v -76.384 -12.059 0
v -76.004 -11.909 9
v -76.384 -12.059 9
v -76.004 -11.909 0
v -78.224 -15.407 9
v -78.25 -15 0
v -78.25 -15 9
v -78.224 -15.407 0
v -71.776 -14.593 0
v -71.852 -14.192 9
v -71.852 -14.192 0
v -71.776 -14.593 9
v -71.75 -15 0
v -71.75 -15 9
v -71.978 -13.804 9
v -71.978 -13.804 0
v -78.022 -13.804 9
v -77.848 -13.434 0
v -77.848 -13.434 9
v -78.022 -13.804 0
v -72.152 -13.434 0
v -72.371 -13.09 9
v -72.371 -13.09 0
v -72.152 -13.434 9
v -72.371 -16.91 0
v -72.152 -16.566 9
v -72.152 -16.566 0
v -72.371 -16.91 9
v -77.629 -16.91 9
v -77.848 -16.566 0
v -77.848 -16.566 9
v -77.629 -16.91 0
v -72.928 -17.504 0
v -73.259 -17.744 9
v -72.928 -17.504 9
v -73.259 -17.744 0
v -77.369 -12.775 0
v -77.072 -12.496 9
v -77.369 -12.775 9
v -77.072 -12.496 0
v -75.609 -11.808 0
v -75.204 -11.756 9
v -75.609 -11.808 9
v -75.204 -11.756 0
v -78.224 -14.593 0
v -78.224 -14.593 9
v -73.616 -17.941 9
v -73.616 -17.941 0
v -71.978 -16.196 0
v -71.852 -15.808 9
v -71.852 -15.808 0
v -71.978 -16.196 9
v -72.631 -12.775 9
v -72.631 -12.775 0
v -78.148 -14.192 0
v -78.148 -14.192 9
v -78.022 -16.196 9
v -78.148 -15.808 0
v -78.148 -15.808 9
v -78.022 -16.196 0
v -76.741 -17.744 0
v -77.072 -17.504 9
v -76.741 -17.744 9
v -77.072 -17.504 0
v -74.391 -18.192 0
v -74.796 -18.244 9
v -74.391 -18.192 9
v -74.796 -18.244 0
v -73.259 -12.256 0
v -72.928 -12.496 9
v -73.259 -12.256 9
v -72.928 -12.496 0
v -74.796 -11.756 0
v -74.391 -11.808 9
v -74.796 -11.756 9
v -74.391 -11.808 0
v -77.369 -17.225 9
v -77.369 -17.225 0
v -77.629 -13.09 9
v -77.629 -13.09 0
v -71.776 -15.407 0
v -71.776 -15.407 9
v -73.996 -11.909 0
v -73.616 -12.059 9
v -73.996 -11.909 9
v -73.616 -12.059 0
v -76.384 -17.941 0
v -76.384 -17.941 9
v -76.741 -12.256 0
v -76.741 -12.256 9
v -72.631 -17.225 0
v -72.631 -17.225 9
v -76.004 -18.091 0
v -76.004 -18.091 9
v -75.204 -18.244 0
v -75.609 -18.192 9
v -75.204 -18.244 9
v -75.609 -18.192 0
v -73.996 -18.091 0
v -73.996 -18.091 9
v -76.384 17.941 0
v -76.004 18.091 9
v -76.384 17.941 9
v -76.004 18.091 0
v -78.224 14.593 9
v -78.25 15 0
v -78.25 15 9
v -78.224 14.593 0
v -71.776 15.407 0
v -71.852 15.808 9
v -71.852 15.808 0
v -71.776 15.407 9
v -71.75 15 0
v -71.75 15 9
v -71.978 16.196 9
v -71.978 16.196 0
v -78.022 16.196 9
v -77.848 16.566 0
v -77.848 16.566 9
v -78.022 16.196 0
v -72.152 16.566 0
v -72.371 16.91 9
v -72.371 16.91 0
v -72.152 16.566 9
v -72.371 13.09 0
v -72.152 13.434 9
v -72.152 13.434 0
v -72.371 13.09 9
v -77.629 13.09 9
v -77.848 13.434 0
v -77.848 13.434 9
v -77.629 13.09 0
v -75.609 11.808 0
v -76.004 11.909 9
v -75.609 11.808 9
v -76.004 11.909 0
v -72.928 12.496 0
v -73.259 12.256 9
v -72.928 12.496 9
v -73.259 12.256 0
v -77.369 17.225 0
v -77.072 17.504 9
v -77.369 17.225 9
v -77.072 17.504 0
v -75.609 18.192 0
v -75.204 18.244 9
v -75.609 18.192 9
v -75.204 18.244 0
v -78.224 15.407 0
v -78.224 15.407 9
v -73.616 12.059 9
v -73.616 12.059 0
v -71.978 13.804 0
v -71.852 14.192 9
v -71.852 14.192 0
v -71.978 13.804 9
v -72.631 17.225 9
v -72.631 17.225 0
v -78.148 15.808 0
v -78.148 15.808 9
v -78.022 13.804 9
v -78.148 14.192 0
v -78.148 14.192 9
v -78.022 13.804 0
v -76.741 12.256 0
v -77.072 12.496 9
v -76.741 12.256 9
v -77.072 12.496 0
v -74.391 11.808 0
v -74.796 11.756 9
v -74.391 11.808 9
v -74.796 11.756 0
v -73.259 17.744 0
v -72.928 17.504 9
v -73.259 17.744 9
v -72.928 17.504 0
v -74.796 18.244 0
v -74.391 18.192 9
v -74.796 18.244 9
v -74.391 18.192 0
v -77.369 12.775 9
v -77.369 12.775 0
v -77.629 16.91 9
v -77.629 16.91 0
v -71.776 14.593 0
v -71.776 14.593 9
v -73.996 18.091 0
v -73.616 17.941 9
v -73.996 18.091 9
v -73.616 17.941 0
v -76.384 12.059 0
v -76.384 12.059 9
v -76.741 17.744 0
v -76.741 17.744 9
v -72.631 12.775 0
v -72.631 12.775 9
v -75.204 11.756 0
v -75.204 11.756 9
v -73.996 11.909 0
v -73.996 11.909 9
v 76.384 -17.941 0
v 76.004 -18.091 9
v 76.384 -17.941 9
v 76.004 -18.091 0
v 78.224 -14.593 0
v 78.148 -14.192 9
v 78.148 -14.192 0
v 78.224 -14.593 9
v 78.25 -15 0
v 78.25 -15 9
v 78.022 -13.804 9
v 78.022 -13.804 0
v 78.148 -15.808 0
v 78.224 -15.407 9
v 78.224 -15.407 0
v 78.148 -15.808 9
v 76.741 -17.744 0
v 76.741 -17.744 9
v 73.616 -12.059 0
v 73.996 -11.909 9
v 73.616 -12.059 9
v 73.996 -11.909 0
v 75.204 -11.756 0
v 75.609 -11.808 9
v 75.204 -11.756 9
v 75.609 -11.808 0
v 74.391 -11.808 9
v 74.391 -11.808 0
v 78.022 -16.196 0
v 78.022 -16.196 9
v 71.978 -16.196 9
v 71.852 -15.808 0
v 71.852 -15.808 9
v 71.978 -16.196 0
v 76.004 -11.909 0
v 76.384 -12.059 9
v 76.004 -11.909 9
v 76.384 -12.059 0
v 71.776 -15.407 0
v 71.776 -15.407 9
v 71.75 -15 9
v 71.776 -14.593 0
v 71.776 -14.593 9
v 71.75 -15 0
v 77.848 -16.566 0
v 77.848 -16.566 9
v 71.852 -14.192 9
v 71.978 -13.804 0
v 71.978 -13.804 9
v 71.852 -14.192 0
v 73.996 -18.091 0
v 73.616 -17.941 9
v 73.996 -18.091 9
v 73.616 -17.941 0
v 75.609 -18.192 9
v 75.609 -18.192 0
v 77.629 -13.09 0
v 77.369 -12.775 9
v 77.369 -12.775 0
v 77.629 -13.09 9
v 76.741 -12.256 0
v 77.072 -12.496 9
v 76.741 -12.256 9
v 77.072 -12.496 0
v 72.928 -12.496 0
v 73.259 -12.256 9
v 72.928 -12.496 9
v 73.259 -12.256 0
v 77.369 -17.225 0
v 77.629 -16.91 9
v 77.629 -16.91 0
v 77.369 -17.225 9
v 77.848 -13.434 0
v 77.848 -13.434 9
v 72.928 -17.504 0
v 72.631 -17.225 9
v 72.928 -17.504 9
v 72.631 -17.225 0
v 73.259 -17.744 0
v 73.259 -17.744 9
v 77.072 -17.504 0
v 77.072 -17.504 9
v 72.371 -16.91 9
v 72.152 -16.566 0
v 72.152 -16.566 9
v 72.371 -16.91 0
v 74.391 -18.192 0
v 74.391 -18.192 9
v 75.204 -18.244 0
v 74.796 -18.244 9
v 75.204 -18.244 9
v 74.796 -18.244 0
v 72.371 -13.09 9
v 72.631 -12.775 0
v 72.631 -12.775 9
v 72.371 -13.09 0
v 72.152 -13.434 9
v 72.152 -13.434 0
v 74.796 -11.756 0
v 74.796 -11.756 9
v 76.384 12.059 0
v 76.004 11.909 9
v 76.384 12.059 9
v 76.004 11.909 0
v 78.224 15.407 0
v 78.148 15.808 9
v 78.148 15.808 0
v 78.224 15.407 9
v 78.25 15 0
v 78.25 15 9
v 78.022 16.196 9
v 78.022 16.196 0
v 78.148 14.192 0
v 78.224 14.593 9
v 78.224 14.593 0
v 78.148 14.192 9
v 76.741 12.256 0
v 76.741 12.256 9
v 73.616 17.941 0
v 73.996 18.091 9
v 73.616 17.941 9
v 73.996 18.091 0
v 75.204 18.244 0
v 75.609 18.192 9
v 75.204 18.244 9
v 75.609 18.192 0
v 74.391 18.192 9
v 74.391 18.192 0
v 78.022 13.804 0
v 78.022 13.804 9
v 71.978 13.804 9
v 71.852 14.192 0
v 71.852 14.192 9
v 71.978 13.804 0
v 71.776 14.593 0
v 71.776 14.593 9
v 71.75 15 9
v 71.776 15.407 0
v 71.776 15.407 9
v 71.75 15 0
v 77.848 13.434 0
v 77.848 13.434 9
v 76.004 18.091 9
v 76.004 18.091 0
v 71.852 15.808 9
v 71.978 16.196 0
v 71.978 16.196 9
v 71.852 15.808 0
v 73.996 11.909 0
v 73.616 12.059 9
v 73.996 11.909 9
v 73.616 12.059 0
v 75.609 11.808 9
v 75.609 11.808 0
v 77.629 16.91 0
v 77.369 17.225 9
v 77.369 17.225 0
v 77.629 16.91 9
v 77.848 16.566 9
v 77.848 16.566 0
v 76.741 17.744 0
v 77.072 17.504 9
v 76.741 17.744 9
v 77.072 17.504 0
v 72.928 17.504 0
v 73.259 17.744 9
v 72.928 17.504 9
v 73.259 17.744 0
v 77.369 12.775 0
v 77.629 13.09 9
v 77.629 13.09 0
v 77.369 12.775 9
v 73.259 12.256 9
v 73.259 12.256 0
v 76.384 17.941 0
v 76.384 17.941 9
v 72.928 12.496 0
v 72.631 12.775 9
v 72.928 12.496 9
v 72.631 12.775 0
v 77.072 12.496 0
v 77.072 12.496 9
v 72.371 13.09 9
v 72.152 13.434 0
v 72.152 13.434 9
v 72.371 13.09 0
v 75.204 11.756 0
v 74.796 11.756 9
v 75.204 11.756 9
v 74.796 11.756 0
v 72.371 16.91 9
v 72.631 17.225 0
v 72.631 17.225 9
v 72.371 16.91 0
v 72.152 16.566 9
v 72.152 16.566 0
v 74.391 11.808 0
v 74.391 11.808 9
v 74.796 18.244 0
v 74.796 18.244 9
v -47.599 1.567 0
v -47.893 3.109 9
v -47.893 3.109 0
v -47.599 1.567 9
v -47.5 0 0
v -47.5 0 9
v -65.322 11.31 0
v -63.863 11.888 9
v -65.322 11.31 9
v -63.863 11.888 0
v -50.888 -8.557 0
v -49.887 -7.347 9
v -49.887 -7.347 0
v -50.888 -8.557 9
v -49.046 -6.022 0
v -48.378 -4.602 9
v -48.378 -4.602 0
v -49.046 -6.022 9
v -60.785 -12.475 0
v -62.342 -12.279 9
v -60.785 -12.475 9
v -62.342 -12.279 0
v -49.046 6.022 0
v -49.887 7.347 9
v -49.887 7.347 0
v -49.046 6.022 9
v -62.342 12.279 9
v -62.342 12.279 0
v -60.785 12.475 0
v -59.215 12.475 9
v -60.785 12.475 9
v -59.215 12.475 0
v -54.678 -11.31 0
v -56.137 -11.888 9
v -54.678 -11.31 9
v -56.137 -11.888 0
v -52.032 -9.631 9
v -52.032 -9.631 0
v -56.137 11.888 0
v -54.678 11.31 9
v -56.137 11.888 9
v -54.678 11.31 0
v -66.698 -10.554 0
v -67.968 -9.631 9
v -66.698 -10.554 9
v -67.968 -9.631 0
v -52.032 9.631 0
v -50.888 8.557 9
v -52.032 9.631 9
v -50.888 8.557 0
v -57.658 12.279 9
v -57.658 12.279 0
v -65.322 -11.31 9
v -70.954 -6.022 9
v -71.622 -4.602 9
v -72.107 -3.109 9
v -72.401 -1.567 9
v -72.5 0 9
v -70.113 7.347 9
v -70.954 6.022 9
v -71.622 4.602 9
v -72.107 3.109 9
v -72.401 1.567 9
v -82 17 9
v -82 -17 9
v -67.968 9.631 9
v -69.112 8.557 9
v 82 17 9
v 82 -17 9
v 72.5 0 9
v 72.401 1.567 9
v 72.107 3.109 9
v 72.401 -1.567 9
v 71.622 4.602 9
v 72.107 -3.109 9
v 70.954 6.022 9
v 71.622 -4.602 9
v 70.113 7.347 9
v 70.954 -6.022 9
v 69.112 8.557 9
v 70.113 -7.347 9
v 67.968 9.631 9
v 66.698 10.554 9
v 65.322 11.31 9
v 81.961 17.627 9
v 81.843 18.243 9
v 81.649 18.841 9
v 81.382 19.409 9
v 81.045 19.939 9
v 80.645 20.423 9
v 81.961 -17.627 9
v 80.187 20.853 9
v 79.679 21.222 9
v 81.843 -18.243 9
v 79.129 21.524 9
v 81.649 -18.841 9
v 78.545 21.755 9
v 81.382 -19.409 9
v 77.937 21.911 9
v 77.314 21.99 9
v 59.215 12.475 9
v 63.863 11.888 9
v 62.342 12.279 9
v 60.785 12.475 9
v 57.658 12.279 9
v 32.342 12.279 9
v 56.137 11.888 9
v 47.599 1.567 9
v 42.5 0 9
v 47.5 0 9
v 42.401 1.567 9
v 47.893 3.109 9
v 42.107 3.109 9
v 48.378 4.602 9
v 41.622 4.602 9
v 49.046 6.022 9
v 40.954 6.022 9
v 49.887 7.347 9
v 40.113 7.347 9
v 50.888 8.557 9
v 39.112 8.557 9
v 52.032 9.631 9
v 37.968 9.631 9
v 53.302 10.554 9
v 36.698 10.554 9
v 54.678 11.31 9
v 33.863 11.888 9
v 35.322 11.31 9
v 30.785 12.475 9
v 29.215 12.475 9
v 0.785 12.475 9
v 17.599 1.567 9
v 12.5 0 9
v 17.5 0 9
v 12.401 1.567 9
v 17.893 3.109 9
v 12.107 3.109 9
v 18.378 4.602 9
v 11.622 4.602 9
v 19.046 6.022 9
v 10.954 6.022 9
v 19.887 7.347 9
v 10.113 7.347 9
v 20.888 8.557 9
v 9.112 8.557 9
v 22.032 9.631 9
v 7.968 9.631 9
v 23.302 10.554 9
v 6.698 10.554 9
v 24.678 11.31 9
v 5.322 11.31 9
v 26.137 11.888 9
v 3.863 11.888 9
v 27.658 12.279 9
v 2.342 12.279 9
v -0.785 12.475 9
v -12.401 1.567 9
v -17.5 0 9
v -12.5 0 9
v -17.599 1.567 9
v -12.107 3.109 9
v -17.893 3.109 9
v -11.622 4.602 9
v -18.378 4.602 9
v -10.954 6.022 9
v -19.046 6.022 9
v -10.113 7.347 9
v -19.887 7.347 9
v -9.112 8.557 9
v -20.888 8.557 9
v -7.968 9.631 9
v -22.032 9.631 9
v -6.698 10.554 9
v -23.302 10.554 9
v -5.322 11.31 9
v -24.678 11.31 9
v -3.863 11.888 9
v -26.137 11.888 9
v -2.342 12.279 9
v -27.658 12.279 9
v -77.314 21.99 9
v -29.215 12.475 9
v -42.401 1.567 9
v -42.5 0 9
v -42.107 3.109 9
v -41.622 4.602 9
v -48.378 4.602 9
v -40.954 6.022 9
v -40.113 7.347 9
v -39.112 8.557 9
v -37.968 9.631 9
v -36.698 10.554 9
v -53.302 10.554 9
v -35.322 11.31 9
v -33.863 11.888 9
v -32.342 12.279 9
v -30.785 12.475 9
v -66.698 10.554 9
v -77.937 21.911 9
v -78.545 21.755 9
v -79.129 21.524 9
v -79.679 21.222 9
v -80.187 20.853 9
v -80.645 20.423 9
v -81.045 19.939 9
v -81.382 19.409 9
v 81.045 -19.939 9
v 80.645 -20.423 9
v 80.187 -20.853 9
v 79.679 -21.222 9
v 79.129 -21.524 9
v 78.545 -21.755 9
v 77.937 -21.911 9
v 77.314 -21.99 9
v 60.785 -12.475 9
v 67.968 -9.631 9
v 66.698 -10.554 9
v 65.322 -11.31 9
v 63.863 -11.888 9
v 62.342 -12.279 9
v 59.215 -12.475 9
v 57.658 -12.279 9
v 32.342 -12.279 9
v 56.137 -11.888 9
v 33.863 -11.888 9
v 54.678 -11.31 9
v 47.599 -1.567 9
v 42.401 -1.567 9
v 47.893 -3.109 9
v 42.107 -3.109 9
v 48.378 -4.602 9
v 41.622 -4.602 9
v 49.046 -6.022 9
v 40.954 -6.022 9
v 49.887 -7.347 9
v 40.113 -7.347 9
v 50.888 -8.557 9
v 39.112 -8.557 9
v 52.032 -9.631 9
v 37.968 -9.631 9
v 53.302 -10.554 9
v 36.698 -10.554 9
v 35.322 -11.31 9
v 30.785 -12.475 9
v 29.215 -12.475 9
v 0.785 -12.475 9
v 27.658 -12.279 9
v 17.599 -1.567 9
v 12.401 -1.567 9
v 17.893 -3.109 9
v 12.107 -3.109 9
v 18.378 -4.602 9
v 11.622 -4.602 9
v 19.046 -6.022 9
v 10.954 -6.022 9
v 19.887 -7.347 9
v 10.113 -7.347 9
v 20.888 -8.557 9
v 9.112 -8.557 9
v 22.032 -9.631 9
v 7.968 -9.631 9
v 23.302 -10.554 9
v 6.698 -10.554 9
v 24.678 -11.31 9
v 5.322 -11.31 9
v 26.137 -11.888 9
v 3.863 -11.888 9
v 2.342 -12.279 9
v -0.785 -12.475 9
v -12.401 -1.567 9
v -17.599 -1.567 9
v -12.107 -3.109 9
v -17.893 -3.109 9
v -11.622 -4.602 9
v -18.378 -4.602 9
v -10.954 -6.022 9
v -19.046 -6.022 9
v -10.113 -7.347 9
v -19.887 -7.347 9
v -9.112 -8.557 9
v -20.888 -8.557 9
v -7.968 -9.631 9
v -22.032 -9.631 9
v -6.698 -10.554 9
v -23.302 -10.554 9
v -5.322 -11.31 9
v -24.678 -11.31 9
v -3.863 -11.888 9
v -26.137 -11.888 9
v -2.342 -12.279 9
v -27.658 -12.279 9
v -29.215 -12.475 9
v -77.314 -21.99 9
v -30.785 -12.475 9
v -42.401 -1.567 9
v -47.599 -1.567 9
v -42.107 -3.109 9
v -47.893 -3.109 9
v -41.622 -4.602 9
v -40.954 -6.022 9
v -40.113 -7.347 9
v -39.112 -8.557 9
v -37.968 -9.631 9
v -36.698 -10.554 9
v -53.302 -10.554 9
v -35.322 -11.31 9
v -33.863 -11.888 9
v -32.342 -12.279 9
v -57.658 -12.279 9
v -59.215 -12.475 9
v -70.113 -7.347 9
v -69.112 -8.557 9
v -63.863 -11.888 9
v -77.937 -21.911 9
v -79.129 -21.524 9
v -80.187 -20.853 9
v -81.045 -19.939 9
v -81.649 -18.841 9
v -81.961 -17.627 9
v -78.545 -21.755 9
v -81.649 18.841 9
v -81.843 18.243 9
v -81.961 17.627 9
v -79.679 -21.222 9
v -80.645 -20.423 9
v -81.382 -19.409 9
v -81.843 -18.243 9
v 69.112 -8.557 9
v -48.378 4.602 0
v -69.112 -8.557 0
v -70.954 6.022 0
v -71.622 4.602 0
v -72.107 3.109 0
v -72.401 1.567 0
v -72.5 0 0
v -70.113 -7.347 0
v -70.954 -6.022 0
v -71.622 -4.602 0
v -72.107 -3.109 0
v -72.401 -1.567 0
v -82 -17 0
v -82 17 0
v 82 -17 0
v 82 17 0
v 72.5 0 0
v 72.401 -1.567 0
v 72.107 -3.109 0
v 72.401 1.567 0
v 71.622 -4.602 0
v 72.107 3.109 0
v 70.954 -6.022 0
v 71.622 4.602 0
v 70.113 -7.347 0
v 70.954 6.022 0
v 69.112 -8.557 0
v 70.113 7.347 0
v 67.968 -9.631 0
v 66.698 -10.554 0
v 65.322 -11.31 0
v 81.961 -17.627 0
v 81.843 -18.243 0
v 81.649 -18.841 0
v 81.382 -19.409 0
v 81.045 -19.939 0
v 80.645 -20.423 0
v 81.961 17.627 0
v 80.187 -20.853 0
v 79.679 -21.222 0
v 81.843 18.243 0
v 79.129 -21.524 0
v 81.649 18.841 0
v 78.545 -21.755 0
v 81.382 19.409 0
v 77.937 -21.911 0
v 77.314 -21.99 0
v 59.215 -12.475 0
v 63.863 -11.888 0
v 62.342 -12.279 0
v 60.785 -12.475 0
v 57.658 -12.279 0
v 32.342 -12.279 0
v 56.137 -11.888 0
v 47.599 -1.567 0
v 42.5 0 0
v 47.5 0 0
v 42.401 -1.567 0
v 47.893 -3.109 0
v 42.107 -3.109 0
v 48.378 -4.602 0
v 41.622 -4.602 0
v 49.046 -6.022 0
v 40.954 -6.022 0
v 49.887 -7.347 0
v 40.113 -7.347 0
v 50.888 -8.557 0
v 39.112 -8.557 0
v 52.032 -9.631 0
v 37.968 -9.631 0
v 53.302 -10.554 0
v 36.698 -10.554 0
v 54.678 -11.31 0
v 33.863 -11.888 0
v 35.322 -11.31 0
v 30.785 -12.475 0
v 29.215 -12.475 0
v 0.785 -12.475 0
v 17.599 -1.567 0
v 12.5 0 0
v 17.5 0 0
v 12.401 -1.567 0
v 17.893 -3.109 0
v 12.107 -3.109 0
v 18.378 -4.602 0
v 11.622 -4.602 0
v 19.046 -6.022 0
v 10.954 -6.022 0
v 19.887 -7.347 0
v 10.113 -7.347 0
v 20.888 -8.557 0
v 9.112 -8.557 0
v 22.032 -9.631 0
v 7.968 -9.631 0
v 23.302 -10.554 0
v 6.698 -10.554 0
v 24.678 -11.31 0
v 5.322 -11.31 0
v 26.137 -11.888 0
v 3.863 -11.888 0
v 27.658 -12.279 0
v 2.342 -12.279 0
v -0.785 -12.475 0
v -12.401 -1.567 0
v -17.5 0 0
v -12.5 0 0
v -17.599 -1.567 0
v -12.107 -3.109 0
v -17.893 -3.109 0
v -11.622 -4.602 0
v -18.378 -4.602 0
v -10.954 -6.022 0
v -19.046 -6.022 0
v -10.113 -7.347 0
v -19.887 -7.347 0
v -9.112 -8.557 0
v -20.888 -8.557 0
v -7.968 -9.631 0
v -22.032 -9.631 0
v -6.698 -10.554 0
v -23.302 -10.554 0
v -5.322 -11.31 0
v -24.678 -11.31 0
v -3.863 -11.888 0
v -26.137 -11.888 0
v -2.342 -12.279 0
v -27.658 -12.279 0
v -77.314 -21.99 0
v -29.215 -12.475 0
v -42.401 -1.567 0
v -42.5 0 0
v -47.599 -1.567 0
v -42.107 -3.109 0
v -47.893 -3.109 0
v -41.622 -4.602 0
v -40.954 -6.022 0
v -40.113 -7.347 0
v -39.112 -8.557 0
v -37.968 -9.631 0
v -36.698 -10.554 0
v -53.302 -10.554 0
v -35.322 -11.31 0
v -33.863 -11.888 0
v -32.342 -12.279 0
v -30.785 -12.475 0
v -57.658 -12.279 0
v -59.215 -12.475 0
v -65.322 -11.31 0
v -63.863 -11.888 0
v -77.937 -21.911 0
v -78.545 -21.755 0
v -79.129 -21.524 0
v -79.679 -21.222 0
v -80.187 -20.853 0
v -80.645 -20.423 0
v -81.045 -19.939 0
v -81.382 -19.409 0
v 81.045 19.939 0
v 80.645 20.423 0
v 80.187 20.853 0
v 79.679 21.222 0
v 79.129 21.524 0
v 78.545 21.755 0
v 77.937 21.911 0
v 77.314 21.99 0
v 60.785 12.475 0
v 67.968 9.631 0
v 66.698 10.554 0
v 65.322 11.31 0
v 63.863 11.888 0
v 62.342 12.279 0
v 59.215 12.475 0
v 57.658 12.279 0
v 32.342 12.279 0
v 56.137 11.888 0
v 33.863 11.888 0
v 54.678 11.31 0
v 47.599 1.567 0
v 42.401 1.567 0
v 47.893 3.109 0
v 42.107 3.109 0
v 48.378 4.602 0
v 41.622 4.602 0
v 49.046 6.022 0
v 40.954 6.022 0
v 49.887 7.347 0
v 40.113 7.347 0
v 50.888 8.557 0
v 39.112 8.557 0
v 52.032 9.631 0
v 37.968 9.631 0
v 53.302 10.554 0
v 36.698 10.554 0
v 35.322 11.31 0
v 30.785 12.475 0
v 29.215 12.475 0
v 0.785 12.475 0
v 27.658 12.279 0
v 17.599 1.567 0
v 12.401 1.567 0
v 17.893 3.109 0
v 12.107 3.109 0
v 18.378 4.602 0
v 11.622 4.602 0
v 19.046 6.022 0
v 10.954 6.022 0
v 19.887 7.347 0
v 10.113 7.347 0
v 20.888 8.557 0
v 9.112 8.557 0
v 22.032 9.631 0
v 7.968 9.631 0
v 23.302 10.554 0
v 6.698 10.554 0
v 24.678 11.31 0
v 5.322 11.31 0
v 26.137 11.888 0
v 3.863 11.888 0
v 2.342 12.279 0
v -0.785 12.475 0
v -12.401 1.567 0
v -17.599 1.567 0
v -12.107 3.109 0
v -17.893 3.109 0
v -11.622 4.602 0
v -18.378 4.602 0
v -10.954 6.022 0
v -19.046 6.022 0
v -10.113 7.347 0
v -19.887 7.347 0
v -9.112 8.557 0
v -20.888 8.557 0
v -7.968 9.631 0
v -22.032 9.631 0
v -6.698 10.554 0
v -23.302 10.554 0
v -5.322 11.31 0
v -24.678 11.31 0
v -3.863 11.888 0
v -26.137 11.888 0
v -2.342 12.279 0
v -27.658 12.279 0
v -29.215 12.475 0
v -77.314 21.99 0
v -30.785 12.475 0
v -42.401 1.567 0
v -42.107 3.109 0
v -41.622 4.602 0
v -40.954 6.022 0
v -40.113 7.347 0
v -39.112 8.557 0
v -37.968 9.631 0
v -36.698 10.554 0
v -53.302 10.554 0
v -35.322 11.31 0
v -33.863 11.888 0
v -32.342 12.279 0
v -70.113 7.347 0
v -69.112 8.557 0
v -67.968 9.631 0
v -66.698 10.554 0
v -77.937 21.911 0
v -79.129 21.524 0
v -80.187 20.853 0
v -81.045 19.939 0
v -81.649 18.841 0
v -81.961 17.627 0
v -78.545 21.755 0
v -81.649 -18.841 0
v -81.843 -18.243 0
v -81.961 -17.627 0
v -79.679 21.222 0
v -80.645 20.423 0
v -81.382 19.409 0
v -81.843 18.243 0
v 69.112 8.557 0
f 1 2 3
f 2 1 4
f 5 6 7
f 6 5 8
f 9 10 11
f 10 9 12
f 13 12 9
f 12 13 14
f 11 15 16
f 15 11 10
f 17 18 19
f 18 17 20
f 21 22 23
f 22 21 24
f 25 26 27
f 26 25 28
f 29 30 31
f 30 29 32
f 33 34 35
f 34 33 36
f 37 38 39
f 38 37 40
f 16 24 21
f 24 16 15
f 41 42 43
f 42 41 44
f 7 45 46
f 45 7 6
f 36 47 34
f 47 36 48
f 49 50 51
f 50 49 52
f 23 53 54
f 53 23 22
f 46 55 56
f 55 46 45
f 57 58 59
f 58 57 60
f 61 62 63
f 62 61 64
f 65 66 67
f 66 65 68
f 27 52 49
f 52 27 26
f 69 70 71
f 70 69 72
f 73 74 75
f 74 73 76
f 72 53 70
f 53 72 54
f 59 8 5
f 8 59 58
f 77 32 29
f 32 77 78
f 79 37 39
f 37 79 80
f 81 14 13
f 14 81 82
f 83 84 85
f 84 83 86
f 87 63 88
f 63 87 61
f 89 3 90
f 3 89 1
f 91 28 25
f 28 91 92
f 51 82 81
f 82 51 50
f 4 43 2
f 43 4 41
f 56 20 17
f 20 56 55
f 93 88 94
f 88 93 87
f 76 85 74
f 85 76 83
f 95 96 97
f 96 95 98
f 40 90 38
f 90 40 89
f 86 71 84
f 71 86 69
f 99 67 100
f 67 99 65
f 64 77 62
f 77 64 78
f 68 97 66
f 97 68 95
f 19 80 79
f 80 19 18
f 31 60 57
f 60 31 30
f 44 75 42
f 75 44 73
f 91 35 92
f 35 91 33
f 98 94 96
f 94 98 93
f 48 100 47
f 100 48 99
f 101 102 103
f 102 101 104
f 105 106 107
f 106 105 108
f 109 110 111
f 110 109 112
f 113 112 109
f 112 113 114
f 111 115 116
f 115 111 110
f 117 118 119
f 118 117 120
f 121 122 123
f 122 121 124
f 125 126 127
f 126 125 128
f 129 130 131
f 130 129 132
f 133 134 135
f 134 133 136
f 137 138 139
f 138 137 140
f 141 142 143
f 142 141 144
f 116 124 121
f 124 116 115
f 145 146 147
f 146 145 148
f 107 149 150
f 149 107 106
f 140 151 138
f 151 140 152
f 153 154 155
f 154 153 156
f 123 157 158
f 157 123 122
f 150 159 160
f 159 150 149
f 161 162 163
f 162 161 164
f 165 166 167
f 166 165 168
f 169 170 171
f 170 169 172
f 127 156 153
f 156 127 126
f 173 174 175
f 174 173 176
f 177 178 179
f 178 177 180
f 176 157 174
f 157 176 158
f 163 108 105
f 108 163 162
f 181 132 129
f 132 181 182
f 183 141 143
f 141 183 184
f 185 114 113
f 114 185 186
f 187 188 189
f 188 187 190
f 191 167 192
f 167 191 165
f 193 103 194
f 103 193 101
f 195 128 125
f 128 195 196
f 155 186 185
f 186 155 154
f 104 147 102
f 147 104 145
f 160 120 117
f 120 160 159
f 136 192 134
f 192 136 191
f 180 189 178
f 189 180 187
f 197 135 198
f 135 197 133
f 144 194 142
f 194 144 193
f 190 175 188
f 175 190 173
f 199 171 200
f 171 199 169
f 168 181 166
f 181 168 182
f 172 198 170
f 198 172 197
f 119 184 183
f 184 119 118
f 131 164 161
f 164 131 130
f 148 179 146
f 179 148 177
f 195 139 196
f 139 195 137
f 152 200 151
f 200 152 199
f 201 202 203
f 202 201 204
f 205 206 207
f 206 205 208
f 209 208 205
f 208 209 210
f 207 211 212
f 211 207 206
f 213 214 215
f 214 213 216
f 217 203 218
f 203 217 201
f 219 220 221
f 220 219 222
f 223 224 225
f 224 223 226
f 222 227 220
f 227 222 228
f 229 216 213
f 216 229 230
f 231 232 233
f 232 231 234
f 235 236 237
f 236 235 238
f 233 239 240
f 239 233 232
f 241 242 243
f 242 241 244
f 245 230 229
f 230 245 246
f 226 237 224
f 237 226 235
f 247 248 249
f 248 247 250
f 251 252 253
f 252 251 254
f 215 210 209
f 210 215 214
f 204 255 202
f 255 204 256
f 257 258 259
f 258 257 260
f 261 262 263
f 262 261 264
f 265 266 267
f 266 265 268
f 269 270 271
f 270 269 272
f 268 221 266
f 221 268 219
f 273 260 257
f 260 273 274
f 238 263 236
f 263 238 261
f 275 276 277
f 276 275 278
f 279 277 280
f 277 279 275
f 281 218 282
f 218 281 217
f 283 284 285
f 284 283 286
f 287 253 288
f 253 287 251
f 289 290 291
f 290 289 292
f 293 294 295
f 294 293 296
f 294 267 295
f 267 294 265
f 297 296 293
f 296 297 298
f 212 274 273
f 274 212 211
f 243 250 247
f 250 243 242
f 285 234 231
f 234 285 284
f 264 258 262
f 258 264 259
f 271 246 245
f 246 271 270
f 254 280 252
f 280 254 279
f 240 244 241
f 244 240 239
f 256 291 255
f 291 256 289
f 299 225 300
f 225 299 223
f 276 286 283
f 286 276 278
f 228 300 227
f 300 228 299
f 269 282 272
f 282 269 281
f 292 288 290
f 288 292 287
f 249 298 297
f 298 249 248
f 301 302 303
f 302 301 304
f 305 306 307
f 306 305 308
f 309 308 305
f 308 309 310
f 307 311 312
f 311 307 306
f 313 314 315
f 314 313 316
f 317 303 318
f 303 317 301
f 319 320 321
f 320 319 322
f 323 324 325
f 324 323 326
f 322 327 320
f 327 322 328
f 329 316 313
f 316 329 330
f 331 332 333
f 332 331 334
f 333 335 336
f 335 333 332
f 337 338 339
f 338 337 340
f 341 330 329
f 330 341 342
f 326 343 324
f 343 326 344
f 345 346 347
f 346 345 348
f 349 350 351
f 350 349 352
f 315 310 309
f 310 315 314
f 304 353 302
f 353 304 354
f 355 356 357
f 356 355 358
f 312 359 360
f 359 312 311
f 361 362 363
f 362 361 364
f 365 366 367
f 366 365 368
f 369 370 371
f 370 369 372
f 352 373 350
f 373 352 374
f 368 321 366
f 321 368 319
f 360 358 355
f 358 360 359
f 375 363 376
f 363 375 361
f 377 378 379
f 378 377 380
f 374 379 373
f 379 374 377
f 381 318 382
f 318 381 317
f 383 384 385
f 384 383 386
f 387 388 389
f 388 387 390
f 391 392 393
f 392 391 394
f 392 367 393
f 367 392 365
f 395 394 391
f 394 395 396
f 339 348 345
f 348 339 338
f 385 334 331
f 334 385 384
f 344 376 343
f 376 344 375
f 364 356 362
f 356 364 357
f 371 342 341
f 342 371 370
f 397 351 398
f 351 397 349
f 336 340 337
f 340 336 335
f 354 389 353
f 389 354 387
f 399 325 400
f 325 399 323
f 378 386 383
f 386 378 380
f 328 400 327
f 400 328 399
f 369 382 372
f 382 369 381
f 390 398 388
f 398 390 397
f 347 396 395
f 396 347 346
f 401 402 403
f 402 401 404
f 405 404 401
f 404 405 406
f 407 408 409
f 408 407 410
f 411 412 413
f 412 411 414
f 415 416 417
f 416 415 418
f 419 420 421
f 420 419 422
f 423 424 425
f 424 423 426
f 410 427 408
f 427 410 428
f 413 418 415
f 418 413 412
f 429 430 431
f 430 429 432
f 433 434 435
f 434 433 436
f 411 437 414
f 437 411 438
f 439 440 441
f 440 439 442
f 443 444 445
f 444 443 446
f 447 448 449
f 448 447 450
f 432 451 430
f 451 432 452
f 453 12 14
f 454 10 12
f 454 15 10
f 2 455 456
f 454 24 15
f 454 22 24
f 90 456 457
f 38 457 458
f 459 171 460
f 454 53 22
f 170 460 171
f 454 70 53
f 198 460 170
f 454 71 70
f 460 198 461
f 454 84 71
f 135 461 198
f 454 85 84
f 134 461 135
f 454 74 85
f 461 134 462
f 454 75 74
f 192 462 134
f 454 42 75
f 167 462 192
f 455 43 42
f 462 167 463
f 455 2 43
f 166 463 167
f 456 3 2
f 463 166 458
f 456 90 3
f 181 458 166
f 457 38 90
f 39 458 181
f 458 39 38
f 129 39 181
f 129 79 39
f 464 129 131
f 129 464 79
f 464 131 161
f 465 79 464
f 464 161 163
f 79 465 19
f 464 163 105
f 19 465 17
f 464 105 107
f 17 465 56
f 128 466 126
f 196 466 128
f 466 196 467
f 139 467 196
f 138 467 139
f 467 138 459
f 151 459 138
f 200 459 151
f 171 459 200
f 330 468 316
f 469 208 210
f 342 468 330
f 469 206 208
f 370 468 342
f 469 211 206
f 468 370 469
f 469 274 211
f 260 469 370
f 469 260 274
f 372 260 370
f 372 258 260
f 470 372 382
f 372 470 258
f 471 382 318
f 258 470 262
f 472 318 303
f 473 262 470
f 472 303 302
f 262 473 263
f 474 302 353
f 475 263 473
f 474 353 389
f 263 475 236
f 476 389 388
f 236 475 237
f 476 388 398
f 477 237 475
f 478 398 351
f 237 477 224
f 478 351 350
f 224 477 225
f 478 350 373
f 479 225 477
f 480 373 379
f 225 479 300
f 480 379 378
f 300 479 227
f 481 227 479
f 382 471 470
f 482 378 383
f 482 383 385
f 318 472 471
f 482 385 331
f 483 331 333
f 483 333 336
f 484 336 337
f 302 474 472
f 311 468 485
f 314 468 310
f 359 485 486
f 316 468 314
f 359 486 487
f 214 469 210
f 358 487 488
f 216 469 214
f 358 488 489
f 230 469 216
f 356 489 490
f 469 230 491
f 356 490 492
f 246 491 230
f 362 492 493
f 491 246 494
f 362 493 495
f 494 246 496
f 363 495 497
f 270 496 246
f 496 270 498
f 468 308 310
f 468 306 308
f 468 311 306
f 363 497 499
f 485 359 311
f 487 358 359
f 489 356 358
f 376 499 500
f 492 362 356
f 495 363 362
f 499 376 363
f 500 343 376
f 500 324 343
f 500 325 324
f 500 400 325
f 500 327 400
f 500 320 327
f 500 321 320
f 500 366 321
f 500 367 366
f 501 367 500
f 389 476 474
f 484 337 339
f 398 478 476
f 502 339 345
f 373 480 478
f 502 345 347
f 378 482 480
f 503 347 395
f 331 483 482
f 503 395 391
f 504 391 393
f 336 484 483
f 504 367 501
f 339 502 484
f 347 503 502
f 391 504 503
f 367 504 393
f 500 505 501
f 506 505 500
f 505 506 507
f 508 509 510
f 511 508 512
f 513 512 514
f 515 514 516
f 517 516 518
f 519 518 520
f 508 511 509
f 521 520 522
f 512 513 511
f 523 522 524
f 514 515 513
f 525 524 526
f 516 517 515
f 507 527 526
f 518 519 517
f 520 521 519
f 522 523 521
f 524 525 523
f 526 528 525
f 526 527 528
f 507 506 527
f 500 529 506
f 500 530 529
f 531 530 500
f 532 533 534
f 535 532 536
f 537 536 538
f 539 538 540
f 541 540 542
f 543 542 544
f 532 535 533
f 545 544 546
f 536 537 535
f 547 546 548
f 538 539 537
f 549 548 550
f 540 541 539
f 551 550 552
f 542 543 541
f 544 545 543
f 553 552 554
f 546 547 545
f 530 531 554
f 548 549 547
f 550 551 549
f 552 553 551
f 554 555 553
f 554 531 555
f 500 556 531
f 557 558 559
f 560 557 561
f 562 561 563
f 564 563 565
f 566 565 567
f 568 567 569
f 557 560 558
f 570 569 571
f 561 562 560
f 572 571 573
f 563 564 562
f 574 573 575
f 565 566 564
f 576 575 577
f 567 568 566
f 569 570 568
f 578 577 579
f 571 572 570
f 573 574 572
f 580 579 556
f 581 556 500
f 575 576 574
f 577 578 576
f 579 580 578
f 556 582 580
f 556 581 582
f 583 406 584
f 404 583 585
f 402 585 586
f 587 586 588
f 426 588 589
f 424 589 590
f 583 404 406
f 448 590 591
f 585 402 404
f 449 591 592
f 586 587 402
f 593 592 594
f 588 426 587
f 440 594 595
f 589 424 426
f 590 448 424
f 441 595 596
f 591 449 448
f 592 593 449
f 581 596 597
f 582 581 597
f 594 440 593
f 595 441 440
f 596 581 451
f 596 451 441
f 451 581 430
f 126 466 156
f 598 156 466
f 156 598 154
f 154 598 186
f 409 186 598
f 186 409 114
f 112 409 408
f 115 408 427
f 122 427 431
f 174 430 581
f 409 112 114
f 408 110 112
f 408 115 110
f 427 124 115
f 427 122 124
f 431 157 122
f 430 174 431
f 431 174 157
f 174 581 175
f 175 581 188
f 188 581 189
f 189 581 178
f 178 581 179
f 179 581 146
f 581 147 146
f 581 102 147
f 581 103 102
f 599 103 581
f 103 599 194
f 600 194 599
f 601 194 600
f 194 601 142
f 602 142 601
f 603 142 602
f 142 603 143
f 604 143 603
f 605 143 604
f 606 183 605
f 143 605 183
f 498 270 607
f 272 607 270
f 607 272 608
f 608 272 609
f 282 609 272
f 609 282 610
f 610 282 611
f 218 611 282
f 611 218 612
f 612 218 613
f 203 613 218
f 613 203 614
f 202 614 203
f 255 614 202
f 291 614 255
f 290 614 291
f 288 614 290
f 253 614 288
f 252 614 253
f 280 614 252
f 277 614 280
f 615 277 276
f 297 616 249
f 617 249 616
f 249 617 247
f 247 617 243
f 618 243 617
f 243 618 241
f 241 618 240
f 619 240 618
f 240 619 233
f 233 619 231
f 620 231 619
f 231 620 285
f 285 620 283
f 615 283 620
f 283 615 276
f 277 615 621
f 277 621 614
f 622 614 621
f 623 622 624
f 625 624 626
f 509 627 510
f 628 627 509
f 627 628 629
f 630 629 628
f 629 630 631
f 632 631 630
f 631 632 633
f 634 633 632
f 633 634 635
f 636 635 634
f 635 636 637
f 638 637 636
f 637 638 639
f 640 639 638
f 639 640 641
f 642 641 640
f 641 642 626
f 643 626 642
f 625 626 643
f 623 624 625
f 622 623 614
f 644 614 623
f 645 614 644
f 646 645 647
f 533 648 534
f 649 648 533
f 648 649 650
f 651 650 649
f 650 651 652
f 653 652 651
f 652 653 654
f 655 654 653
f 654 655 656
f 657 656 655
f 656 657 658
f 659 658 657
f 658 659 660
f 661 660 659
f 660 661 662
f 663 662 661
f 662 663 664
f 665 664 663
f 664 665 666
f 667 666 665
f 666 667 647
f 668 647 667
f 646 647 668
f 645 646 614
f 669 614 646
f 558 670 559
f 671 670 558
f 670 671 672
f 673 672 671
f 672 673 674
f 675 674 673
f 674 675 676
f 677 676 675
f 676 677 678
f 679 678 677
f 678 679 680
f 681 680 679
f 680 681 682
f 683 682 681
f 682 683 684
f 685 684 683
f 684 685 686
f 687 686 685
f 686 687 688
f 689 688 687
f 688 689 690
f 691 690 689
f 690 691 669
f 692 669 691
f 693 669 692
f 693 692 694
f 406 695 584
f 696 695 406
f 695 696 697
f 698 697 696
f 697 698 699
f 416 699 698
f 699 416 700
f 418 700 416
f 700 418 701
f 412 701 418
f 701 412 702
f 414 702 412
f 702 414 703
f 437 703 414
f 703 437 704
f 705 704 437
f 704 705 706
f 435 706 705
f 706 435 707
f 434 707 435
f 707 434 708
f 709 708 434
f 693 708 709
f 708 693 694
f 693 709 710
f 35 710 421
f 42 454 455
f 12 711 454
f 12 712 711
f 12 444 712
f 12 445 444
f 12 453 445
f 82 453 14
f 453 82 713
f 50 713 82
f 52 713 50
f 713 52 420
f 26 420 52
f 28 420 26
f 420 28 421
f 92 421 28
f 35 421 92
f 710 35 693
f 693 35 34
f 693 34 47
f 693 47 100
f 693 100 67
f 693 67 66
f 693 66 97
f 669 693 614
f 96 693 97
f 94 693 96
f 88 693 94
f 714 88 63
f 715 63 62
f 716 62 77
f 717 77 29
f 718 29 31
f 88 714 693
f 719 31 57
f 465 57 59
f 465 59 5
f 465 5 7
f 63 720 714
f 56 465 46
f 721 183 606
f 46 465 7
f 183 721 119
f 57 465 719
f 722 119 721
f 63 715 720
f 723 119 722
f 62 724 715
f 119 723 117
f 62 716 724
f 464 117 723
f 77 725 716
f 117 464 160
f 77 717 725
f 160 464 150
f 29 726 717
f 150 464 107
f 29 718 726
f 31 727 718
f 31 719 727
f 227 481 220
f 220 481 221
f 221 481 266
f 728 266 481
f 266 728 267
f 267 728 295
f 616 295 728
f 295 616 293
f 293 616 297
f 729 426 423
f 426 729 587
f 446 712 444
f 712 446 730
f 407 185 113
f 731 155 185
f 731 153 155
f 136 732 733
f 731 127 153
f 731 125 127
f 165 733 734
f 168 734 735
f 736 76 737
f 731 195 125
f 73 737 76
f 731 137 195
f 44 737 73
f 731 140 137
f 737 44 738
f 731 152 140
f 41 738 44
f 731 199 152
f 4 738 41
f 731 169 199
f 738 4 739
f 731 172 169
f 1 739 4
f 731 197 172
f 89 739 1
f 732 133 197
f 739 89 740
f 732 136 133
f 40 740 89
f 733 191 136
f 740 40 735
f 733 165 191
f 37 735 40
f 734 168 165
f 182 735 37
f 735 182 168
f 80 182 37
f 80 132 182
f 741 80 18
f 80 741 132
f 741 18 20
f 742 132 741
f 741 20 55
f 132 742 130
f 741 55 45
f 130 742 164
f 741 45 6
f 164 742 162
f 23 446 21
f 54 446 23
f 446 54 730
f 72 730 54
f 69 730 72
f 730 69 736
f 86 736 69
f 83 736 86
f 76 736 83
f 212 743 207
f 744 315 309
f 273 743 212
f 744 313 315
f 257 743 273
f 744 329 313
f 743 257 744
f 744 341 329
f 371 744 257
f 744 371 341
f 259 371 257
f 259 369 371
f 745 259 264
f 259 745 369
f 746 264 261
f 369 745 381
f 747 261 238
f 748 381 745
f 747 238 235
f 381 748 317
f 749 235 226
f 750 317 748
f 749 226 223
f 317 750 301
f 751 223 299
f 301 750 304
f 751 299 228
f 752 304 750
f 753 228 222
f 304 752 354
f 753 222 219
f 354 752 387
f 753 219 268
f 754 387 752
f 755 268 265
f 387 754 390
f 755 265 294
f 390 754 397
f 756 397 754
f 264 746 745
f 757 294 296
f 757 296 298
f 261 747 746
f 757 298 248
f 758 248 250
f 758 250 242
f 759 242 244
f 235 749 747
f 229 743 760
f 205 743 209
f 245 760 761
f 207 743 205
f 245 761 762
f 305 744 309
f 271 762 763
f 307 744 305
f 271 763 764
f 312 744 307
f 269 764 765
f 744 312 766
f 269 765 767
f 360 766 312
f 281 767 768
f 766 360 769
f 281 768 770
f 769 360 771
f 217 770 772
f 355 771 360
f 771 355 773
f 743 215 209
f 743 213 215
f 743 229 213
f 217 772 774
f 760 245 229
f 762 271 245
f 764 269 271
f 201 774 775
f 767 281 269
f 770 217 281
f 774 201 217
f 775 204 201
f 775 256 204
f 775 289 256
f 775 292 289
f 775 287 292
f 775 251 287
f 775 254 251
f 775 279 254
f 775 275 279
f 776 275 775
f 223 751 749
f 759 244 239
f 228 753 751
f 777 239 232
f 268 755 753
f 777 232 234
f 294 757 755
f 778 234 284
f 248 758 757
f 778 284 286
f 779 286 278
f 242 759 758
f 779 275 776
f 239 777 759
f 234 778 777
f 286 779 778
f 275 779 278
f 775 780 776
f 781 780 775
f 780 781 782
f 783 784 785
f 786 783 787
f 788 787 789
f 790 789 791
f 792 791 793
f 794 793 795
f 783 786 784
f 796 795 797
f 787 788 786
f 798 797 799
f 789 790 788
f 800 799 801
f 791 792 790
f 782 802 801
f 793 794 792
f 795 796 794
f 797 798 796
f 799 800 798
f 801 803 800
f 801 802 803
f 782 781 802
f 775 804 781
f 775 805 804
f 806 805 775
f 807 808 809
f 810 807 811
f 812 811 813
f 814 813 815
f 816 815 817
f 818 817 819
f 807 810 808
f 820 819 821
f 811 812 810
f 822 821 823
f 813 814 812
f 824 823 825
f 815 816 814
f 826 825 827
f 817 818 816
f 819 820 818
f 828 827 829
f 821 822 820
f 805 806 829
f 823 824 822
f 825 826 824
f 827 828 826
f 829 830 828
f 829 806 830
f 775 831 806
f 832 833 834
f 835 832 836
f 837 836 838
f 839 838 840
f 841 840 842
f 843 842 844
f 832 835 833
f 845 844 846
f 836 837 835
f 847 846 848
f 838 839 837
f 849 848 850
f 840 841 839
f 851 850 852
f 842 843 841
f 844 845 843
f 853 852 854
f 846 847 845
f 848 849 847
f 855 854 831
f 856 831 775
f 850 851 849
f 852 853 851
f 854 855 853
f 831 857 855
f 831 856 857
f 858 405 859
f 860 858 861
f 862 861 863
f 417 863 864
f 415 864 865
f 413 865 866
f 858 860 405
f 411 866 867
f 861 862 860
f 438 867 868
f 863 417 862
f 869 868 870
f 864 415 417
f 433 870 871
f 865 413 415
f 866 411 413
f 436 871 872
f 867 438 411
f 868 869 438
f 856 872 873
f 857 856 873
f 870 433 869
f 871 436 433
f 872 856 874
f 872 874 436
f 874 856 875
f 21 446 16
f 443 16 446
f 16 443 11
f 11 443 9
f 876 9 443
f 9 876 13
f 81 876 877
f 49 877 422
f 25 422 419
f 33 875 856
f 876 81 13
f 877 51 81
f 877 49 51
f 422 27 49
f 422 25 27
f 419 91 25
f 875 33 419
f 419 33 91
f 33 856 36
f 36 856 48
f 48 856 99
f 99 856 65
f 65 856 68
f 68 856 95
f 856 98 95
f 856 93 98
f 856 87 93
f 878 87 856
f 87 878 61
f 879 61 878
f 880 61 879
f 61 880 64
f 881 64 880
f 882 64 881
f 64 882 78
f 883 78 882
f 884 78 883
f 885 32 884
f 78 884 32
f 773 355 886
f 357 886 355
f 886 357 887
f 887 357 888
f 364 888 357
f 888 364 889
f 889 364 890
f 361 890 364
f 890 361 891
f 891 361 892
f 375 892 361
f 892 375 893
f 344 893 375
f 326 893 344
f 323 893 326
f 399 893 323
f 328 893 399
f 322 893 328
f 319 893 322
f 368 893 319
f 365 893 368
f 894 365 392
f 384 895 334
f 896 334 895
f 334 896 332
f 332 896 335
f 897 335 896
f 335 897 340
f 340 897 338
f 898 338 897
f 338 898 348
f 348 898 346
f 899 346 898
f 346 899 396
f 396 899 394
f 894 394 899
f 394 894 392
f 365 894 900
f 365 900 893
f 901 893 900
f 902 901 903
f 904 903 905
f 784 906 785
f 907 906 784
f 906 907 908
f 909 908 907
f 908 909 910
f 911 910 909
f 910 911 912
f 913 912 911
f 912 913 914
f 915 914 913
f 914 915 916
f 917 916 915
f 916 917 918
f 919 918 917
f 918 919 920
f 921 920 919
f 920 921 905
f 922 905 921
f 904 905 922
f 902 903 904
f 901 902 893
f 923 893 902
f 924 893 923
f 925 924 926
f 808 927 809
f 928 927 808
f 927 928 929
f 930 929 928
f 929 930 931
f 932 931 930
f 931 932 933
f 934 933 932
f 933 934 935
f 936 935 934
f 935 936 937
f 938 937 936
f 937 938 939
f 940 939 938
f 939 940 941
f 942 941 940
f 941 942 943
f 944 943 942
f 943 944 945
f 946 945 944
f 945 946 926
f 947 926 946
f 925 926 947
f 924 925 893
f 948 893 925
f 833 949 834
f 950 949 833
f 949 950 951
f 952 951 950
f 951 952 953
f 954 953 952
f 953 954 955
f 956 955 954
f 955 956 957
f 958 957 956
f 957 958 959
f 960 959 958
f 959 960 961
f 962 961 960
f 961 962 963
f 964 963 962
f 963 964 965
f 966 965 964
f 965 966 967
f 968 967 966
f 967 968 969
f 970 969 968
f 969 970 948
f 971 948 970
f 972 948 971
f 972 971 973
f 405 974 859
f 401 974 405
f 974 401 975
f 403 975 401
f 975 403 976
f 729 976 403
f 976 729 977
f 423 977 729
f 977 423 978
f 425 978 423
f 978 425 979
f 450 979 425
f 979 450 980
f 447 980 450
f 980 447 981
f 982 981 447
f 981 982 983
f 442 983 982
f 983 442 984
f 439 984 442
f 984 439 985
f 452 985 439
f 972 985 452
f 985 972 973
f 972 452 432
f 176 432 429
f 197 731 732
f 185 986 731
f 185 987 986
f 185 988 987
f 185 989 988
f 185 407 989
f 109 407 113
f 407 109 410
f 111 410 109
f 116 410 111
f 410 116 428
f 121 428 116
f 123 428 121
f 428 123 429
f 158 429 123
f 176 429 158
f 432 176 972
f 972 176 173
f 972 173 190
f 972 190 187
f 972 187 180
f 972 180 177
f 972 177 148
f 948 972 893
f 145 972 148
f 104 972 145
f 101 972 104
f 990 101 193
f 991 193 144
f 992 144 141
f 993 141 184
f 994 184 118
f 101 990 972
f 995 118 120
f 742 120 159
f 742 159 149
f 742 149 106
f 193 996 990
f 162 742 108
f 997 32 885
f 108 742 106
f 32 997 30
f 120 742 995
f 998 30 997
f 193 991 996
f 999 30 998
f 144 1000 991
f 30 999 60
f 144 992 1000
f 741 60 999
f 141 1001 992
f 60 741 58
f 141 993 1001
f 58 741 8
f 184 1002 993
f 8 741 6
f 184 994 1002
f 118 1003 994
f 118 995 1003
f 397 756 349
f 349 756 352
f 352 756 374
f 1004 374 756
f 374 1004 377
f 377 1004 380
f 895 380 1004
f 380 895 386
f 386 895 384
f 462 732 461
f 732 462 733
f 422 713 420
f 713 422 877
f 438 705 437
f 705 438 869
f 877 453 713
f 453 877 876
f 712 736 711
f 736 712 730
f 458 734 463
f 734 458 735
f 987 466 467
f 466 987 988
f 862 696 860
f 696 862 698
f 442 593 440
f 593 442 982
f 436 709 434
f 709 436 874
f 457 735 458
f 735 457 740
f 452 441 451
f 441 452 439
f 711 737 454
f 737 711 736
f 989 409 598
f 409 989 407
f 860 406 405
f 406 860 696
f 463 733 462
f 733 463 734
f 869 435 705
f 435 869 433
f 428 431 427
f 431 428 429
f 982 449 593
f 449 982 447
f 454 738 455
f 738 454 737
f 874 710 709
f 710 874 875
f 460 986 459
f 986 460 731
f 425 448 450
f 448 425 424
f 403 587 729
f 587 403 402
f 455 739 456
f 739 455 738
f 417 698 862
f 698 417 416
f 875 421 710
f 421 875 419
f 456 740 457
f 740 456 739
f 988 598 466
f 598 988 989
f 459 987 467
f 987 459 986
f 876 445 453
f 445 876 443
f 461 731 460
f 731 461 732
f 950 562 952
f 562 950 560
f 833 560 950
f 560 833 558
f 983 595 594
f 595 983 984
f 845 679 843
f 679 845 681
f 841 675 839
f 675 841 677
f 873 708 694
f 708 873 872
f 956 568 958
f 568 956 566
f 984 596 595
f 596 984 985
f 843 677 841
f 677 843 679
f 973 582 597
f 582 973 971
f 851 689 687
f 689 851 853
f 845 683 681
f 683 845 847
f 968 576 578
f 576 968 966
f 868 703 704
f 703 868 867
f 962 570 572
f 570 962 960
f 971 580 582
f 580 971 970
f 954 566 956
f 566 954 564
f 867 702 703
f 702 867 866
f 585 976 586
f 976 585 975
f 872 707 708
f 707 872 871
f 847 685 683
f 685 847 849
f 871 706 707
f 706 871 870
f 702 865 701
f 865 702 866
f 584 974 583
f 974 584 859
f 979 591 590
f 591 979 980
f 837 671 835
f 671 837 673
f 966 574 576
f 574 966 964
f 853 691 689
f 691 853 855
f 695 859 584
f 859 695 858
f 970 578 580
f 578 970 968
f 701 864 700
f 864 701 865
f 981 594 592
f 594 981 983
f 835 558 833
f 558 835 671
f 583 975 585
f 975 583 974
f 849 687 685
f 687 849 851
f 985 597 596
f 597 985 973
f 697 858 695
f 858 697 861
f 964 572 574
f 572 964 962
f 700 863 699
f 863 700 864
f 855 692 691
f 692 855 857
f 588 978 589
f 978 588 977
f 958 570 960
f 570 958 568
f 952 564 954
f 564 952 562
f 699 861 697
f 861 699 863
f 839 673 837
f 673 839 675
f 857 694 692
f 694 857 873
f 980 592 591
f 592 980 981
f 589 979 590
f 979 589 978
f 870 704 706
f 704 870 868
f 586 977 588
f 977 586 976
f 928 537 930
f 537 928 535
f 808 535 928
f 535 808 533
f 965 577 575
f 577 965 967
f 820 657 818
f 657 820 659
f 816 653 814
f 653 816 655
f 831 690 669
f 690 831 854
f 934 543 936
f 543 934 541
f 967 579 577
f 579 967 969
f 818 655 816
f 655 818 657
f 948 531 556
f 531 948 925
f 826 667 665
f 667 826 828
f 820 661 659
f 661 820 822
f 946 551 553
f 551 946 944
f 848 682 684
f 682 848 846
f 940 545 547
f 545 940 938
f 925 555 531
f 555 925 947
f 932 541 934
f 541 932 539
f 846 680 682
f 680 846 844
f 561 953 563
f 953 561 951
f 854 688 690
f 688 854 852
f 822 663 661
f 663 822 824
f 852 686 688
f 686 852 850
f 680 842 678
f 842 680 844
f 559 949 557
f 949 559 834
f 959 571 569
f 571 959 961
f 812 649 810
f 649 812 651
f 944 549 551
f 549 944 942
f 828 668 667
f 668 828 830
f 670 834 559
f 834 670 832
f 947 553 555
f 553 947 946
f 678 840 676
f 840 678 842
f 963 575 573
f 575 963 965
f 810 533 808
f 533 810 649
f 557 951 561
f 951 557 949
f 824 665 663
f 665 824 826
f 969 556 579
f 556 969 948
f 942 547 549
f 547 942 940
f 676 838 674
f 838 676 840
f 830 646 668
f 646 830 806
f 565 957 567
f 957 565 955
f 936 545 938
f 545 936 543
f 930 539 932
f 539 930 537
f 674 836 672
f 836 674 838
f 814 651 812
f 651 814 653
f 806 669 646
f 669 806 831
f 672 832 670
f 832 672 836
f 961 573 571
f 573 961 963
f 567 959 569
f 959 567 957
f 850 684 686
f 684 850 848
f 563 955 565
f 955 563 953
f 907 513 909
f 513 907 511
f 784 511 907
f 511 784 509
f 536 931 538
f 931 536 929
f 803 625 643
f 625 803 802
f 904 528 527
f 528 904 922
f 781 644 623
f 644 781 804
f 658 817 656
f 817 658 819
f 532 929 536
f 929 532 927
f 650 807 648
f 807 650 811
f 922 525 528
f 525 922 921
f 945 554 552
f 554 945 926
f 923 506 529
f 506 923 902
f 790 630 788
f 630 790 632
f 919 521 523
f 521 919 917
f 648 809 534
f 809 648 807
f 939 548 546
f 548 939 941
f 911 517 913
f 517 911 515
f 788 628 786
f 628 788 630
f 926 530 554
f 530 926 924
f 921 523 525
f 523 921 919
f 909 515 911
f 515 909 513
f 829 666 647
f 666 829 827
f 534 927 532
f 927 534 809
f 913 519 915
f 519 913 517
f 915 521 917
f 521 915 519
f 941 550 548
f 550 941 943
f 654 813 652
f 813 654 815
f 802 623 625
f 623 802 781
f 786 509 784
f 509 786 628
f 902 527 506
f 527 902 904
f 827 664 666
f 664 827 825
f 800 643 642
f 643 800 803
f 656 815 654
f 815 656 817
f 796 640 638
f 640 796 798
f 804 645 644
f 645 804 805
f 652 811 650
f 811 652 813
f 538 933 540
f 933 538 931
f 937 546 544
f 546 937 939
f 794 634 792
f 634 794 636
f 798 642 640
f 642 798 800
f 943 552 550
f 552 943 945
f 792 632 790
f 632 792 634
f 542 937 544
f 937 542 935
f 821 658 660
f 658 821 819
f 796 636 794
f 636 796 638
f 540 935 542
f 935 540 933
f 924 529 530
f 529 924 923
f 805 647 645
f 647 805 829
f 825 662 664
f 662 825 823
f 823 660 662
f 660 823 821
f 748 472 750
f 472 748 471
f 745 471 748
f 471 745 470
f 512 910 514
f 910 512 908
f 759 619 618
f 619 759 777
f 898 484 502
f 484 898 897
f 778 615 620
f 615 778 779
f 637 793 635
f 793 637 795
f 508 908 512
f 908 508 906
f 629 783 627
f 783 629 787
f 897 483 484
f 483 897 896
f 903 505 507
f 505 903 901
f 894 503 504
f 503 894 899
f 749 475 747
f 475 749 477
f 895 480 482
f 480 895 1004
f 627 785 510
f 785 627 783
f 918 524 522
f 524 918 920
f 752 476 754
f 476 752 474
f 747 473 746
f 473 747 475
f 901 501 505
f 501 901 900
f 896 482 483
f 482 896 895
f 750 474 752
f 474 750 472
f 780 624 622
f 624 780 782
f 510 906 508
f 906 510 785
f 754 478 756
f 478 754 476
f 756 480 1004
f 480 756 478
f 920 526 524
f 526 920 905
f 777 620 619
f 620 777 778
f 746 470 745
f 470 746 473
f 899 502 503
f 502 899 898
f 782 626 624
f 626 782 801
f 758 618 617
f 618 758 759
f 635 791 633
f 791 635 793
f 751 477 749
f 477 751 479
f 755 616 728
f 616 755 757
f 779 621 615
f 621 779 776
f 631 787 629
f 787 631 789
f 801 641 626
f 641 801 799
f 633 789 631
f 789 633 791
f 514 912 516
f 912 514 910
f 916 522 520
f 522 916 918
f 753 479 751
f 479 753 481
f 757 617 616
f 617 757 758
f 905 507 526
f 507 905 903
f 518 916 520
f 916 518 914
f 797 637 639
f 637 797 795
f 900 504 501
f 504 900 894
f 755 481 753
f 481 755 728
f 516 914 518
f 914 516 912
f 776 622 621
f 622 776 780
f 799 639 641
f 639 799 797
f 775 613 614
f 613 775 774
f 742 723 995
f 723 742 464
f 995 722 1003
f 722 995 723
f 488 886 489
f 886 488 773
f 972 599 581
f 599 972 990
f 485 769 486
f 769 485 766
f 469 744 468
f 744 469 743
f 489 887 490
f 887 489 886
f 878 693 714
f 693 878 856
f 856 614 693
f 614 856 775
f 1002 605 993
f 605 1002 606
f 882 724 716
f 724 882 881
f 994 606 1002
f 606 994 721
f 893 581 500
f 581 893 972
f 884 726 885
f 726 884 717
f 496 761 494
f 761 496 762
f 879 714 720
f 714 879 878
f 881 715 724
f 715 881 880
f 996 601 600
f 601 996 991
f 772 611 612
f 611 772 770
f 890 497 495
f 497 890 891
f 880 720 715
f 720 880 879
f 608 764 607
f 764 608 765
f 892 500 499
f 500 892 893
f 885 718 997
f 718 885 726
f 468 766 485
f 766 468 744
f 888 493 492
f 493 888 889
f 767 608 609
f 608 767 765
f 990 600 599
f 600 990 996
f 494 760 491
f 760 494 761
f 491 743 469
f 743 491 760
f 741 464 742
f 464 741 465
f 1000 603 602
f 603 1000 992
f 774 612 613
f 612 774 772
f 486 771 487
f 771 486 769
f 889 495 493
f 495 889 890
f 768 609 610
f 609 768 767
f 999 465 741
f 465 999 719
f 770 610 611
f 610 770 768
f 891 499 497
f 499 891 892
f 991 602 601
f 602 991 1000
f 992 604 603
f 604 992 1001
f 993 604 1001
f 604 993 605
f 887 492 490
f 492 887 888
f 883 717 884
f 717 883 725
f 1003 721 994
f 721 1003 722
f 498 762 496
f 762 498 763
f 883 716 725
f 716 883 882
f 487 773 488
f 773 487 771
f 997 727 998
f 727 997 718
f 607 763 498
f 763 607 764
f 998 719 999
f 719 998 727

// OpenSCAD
$fn = 50;


difference() {
	union() {
		hull() {
			translate(v = [-77.0000000000, 17.0000000000, 0]) {
				cylinder(h = 9, r = 5);
			}
			translate(v = [77.0000000000, 17.0000000000, 0]) {
				cylinder(h = 9, r = 5);
			}
			translate(v = [-77.0000000000, -17.0000000000, 0]) {
				cylinder(h = 9, r = 5);
			}
			translate(v = [77.0000000000, -17.0000000000, 0]) {
				cylinder(h = 9, r = 5);
			}
		}
	}
	union() {
		#translate(v = [-75.0000000000, -15.0000000000, -100.0000000000]) {
			cylinder(h = 200, r = 3.2500000000);
		}
		#translate(v = [-75.0000000000, 15.0000000000, -100.0000000000]) {
			cylinder(h = 200, r = 3.2500000000);
		}
		#translate(v = [75.0000000000, -15.0000000000, -100.0000000000]) {
			cylinder(h = 200, r = 3.2500000000);
		}
		#translate(v = [75.0000000000, 15.0000000000, -100.0000000000]) {
			cylinder(h = 200, r = 3.2500000000);
		}
		#translate(v = [-60.0000000000, 0, 0]) {
			cylinder(h = 9, r = 12.5000000000);
		}
		#translate(v = [-30.0000000000, 0, 0]) {
			cylinder(h = 9, r = 12.5000000000);
		}
		#cylinder(h = 9, r = 12.5000000000);
		#translate(v = [30.0000000000, 0, 0]) {
			cylinder(h = 9, r = 12.5000000000);
		}
		#translate(v = [60.0000000000, 0, 0]) {
			cylinder(h = 9, r = 12.5000000000);
		}
	}
}
